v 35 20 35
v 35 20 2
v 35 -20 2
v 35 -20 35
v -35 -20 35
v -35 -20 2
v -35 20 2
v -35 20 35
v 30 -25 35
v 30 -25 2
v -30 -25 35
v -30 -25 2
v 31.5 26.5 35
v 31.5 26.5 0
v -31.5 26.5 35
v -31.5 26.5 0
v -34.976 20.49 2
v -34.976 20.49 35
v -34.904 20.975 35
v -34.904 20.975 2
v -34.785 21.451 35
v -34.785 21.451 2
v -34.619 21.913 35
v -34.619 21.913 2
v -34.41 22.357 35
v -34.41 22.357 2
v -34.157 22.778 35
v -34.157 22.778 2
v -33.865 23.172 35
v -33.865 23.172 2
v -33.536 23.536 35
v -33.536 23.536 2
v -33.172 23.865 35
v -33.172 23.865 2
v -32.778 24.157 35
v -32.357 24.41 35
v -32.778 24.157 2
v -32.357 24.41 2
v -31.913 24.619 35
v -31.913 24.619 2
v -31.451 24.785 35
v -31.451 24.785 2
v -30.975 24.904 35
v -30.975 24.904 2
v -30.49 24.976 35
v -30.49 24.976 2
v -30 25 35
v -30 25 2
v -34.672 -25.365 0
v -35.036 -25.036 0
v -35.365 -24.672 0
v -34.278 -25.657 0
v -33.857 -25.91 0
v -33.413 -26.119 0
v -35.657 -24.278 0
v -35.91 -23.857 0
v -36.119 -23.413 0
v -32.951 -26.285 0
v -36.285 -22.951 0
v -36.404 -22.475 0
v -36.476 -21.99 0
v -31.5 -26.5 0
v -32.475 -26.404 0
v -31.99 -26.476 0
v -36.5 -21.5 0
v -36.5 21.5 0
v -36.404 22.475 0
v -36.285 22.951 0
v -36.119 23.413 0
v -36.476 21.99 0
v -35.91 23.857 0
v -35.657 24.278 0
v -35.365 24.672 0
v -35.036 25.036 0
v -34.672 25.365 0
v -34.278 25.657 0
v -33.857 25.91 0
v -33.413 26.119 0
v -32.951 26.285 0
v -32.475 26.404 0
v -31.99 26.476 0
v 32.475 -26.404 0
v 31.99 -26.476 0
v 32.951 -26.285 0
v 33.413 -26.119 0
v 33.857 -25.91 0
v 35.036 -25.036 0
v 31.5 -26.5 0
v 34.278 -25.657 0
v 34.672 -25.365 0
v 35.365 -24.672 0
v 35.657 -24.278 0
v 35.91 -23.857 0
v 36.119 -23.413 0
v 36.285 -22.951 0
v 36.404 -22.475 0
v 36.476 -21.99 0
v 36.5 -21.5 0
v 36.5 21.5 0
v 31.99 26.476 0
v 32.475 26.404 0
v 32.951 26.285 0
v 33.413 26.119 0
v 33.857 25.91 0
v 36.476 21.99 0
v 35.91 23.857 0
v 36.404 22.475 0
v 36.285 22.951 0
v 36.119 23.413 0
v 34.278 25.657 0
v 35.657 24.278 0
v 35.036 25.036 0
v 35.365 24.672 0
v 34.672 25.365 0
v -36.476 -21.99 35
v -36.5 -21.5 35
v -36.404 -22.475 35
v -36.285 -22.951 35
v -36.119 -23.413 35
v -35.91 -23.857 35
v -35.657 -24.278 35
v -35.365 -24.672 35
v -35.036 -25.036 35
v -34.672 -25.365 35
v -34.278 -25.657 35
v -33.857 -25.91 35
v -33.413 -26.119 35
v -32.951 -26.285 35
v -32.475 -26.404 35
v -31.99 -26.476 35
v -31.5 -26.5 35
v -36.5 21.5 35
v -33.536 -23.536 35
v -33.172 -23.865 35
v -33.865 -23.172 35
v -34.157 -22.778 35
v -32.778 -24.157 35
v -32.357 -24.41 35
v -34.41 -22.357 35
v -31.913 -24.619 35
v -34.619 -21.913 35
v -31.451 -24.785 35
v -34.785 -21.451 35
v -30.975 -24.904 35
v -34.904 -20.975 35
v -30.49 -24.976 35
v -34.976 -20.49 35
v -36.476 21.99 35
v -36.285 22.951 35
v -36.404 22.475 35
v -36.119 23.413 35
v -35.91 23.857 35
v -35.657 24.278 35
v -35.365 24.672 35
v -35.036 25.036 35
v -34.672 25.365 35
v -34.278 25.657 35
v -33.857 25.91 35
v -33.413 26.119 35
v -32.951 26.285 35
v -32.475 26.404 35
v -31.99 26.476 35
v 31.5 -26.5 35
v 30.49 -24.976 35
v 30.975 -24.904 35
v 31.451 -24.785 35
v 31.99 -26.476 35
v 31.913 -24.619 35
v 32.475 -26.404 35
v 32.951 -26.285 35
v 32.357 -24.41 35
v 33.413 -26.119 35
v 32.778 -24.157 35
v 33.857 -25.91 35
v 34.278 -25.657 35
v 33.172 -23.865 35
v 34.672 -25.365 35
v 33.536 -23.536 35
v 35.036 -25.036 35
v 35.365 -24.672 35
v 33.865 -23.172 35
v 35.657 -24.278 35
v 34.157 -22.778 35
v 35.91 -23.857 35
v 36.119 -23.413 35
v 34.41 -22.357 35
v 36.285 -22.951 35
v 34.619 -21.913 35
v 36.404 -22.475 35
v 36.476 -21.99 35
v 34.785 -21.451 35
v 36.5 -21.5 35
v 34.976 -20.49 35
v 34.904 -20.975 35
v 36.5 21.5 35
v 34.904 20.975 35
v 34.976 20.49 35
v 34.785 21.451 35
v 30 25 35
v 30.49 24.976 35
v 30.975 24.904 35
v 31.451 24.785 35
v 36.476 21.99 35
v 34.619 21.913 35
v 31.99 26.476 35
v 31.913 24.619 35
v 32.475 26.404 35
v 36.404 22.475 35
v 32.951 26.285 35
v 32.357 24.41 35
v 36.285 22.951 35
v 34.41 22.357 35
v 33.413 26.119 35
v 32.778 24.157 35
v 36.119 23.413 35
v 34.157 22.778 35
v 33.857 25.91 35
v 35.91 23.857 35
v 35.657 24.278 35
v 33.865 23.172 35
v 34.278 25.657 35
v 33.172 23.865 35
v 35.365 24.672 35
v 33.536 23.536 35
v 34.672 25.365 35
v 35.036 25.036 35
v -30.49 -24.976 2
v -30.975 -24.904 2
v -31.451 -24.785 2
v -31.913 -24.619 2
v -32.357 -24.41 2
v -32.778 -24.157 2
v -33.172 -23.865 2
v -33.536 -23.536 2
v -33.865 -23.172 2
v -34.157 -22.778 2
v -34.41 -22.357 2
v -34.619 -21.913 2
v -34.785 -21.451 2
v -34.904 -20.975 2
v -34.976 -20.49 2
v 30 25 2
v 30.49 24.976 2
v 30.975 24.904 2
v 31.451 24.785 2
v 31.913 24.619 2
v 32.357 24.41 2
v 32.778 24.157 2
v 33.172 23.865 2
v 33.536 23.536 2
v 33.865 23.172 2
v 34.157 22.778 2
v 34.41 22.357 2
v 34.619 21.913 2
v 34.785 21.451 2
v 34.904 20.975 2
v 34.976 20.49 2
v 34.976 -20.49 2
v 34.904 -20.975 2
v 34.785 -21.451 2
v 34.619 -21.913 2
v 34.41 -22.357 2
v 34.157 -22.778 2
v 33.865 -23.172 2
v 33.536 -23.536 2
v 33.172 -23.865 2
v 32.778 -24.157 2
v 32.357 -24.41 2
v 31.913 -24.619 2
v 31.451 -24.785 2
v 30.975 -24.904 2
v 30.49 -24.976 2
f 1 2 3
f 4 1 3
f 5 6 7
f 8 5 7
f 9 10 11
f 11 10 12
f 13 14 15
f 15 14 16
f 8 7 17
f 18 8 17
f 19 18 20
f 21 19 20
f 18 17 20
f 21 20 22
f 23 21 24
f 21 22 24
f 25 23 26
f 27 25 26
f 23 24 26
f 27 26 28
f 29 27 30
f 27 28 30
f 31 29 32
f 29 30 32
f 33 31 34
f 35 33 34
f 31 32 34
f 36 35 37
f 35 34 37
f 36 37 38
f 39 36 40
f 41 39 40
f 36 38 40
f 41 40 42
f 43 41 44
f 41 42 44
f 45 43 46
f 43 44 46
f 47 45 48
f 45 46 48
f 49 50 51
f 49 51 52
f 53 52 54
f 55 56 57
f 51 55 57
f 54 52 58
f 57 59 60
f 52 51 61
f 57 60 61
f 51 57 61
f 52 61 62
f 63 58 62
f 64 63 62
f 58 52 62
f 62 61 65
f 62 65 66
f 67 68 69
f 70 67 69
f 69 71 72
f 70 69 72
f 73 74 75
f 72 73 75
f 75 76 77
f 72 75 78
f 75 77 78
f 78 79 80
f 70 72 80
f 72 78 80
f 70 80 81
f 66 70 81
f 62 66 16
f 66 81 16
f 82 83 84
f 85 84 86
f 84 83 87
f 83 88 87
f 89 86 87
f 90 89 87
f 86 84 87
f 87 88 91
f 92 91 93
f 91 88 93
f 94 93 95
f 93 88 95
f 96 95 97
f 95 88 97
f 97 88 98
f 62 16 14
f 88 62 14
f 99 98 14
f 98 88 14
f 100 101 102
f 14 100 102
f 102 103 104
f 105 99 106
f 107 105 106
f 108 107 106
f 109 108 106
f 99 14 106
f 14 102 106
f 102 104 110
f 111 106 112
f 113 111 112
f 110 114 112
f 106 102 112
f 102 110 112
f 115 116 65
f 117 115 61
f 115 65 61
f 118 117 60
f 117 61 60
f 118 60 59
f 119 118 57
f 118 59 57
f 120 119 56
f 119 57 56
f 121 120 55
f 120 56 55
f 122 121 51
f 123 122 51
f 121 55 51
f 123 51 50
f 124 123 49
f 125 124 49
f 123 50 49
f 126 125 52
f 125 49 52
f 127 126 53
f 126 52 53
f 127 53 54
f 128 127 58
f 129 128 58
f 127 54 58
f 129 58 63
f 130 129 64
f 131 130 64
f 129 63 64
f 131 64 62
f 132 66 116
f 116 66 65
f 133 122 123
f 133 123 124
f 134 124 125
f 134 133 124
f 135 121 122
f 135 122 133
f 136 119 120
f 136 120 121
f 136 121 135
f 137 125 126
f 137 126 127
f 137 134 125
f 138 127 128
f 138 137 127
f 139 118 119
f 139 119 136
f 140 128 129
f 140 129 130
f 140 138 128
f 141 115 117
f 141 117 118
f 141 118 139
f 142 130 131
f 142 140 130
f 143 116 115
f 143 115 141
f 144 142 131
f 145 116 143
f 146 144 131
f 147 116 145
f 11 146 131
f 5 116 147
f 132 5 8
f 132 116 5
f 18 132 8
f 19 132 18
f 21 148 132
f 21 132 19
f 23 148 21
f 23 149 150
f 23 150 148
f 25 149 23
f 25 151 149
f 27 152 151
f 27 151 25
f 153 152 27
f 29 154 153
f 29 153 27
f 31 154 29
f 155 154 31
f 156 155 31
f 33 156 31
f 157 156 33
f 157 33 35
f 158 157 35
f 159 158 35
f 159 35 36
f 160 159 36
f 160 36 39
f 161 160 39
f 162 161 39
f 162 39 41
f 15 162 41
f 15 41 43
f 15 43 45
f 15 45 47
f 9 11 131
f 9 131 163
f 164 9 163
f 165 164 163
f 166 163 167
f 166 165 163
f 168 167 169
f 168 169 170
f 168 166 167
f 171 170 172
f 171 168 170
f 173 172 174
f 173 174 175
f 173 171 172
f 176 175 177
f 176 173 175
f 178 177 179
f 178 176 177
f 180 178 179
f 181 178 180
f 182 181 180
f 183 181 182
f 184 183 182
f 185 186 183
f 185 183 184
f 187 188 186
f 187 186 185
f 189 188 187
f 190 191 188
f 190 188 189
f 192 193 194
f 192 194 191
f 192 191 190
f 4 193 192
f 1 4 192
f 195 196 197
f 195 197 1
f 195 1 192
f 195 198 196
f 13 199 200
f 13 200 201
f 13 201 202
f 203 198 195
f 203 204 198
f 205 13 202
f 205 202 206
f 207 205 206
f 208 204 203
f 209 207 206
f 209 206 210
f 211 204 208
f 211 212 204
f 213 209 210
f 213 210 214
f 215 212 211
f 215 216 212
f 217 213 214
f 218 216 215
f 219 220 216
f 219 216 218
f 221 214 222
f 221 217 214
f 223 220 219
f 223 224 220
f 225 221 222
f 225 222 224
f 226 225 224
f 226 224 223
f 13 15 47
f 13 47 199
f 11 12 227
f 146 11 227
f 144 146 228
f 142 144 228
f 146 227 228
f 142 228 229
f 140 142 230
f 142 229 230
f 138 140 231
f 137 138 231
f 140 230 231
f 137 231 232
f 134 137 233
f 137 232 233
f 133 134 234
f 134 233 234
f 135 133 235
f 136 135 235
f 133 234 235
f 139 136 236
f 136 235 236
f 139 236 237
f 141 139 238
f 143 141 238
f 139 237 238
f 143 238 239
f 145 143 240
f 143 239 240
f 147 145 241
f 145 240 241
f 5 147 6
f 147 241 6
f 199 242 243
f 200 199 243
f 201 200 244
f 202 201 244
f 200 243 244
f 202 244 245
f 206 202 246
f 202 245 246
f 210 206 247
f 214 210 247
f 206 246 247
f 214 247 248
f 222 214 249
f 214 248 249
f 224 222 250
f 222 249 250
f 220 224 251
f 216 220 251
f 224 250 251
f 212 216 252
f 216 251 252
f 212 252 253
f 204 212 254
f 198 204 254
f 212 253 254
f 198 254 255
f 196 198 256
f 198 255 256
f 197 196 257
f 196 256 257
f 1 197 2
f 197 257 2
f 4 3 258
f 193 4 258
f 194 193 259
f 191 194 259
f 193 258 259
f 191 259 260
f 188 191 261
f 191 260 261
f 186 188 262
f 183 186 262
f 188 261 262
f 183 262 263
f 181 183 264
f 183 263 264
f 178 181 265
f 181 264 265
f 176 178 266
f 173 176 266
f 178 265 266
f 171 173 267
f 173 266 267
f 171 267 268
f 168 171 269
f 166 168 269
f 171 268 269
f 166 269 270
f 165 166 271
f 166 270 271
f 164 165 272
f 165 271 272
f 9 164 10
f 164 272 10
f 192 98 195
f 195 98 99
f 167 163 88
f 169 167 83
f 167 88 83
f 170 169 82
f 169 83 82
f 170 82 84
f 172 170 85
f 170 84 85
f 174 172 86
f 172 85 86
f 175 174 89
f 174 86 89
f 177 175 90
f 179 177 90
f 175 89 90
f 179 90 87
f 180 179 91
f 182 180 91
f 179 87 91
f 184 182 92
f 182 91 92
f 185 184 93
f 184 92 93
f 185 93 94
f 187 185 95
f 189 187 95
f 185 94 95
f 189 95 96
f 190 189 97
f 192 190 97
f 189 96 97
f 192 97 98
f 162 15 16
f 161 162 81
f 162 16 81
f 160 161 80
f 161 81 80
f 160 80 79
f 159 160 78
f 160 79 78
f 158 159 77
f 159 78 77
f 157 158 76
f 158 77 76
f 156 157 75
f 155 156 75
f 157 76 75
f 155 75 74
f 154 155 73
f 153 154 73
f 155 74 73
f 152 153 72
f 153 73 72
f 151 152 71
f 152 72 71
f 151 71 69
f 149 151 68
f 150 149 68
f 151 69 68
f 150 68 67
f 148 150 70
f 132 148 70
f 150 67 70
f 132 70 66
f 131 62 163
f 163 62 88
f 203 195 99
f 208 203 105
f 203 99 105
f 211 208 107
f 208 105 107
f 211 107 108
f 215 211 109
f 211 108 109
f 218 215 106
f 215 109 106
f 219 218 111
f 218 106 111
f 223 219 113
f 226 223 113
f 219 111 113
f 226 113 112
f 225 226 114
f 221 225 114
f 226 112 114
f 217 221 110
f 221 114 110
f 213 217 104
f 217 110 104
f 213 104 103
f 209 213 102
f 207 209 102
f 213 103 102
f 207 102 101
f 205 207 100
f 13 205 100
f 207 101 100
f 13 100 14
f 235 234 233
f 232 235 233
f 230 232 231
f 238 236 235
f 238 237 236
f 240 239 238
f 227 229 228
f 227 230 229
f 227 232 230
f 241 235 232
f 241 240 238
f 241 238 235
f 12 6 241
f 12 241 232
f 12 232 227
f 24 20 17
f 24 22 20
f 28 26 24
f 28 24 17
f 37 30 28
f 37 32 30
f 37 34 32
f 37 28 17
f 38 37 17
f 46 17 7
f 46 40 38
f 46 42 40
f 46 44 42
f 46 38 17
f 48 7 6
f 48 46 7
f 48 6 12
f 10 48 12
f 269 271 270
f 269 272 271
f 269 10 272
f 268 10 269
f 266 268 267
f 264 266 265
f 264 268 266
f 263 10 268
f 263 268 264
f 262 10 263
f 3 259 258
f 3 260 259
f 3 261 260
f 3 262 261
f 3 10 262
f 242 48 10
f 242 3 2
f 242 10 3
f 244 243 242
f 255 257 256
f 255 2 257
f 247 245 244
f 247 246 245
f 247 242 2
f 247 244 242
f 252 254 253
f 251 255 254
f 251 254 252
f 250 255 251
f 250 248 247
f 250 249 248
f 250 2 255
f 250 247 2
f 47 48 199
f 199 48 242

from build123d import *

# Parameters (mm, degrees)
F1_DEPTH = 2
F2_DEPTH = 35


with BuildPart() as f1:
    # F0 (on Top) → F1 (new body)
    with BuildSketch(Plane.XY):
        with BuildLine():
            Line((31.5, 26.5), (-31.5, 26.5))
            ThreePointArc((-31.5, 26.5), (-35.0355339059, 25.0355339059), (-36.5, 21.5))
            Line((-36.5, 21.5), (-36.5, -21.5))
            ThreePointArc((-36.5, -21.5), (-35.0355339059, -25.0355339059), (-31.5, -26.5))
            Line((-31.5, -26.5), (31.5, -26.5))
            ThreePointArc((31.5, -26.5), (35.0355339059, -25.0355339059), (36.5, -21.5))
            Line((36.5, -21.5), (36.5, 21.5))
            ThreePointArc((36.5, 21.5), (35.0355339059, 25.0355339059), (31.5, 26.5))
        make_face()
        with BuildLine():
            ThreePointArc((-35, 20), (-33.5355339059, 23.5355339059), (-30, 25))
            Line((-30, 25), (30, 25))
            ThreePointArc((30, 25), (33.5355339059, 23.5355339059), (35, 20))
            Line((35, 20), (35, -20))
            ThreePointArc((35, -20), (33.5355339059, -23.5355339059), (30, -25))
            Line((30, -25), (-30, -25))
            ThreePointArc((-30, -25), (-33.5355339059, -23.5355339059), (-35, -20))
            Line((-35, -20), (-35, 20))
        make_face(mode=Mode.SUBTRACT)
        with BuildLine():
            Line((30, 25), (-30, 25))
            ThreePointArc((-30, 25), (-33.5355339059, 23.5355339059), (-35, 20))
            Line((-35, 20), (-35, -20))
            ThreePointArc((-35, -20), (-33.5355339059, -23.5355339059), (-30, -25))
            Line((-30, -25), (30, -25))
            ThreePointArc((30, -25), (33.5355339059, -23.5355339059), (35, -20))
            Line((35, -20), (35, 20))
            ThreePointArc((35, 20), (33.5355339059, 23.5355339059), (30, 25))
        make_face()
    extrude(amount=F1_DEPTH)

    # F0 (on Top) → F2 (join)
    with BuildSketch(Plane.XY):
        with BuildLine():
            Line((31.5, 26.5), (-31.5, 26.5))
            ThreePointArc((-31.5, 26.5), (-35.0355339059, 25.0355339059), (-36.5, 21.5))
            Line((-36.5, 21.5), (-36.5, -21.5))
            ThreePointArc((-36.5, -21.5), (-35.0355339059, -25.0355339059), (-31.5, -26.5))
            Line((-31.5, -26.5), (31.5, -26.5))
            ThreePointArc((31.5, -26.5), (35.0355339059, -25.0355339059), (36.5, -21.5))
            Line((36.5, -21.5), (36.5, 21.5))
            ThreePointArc((36.5, 21.5), (35.0355339059, 25.0355339059), (31.5, 26.5))
        make_face()
        with BuildLine():
            ThreePointArc((-35, 20), (-33.5355339059, 23.5355339059), (-30, 25))
            Line((-30, 25), (30, 25))
            ThreePointArc((30, 25), (33.5355339059, 23.5355339059), (35, 20))
            Line((35, 20), (35, -20))
            ThreePointArc((35, -20), (33.5355339059, -23.5355339059), (30, -25))
            Line((30, -25), (-30, -25))
            ThreePointArc((-30, -25), (-33.5355339059, -23.5355339059), (-35, -20))
            Line((-35, -20), (-35, 20))
        make_face(mode=Mode.SUBTRACT)
    extrude(amount=F2_DEPTH)


solid = f1.part
